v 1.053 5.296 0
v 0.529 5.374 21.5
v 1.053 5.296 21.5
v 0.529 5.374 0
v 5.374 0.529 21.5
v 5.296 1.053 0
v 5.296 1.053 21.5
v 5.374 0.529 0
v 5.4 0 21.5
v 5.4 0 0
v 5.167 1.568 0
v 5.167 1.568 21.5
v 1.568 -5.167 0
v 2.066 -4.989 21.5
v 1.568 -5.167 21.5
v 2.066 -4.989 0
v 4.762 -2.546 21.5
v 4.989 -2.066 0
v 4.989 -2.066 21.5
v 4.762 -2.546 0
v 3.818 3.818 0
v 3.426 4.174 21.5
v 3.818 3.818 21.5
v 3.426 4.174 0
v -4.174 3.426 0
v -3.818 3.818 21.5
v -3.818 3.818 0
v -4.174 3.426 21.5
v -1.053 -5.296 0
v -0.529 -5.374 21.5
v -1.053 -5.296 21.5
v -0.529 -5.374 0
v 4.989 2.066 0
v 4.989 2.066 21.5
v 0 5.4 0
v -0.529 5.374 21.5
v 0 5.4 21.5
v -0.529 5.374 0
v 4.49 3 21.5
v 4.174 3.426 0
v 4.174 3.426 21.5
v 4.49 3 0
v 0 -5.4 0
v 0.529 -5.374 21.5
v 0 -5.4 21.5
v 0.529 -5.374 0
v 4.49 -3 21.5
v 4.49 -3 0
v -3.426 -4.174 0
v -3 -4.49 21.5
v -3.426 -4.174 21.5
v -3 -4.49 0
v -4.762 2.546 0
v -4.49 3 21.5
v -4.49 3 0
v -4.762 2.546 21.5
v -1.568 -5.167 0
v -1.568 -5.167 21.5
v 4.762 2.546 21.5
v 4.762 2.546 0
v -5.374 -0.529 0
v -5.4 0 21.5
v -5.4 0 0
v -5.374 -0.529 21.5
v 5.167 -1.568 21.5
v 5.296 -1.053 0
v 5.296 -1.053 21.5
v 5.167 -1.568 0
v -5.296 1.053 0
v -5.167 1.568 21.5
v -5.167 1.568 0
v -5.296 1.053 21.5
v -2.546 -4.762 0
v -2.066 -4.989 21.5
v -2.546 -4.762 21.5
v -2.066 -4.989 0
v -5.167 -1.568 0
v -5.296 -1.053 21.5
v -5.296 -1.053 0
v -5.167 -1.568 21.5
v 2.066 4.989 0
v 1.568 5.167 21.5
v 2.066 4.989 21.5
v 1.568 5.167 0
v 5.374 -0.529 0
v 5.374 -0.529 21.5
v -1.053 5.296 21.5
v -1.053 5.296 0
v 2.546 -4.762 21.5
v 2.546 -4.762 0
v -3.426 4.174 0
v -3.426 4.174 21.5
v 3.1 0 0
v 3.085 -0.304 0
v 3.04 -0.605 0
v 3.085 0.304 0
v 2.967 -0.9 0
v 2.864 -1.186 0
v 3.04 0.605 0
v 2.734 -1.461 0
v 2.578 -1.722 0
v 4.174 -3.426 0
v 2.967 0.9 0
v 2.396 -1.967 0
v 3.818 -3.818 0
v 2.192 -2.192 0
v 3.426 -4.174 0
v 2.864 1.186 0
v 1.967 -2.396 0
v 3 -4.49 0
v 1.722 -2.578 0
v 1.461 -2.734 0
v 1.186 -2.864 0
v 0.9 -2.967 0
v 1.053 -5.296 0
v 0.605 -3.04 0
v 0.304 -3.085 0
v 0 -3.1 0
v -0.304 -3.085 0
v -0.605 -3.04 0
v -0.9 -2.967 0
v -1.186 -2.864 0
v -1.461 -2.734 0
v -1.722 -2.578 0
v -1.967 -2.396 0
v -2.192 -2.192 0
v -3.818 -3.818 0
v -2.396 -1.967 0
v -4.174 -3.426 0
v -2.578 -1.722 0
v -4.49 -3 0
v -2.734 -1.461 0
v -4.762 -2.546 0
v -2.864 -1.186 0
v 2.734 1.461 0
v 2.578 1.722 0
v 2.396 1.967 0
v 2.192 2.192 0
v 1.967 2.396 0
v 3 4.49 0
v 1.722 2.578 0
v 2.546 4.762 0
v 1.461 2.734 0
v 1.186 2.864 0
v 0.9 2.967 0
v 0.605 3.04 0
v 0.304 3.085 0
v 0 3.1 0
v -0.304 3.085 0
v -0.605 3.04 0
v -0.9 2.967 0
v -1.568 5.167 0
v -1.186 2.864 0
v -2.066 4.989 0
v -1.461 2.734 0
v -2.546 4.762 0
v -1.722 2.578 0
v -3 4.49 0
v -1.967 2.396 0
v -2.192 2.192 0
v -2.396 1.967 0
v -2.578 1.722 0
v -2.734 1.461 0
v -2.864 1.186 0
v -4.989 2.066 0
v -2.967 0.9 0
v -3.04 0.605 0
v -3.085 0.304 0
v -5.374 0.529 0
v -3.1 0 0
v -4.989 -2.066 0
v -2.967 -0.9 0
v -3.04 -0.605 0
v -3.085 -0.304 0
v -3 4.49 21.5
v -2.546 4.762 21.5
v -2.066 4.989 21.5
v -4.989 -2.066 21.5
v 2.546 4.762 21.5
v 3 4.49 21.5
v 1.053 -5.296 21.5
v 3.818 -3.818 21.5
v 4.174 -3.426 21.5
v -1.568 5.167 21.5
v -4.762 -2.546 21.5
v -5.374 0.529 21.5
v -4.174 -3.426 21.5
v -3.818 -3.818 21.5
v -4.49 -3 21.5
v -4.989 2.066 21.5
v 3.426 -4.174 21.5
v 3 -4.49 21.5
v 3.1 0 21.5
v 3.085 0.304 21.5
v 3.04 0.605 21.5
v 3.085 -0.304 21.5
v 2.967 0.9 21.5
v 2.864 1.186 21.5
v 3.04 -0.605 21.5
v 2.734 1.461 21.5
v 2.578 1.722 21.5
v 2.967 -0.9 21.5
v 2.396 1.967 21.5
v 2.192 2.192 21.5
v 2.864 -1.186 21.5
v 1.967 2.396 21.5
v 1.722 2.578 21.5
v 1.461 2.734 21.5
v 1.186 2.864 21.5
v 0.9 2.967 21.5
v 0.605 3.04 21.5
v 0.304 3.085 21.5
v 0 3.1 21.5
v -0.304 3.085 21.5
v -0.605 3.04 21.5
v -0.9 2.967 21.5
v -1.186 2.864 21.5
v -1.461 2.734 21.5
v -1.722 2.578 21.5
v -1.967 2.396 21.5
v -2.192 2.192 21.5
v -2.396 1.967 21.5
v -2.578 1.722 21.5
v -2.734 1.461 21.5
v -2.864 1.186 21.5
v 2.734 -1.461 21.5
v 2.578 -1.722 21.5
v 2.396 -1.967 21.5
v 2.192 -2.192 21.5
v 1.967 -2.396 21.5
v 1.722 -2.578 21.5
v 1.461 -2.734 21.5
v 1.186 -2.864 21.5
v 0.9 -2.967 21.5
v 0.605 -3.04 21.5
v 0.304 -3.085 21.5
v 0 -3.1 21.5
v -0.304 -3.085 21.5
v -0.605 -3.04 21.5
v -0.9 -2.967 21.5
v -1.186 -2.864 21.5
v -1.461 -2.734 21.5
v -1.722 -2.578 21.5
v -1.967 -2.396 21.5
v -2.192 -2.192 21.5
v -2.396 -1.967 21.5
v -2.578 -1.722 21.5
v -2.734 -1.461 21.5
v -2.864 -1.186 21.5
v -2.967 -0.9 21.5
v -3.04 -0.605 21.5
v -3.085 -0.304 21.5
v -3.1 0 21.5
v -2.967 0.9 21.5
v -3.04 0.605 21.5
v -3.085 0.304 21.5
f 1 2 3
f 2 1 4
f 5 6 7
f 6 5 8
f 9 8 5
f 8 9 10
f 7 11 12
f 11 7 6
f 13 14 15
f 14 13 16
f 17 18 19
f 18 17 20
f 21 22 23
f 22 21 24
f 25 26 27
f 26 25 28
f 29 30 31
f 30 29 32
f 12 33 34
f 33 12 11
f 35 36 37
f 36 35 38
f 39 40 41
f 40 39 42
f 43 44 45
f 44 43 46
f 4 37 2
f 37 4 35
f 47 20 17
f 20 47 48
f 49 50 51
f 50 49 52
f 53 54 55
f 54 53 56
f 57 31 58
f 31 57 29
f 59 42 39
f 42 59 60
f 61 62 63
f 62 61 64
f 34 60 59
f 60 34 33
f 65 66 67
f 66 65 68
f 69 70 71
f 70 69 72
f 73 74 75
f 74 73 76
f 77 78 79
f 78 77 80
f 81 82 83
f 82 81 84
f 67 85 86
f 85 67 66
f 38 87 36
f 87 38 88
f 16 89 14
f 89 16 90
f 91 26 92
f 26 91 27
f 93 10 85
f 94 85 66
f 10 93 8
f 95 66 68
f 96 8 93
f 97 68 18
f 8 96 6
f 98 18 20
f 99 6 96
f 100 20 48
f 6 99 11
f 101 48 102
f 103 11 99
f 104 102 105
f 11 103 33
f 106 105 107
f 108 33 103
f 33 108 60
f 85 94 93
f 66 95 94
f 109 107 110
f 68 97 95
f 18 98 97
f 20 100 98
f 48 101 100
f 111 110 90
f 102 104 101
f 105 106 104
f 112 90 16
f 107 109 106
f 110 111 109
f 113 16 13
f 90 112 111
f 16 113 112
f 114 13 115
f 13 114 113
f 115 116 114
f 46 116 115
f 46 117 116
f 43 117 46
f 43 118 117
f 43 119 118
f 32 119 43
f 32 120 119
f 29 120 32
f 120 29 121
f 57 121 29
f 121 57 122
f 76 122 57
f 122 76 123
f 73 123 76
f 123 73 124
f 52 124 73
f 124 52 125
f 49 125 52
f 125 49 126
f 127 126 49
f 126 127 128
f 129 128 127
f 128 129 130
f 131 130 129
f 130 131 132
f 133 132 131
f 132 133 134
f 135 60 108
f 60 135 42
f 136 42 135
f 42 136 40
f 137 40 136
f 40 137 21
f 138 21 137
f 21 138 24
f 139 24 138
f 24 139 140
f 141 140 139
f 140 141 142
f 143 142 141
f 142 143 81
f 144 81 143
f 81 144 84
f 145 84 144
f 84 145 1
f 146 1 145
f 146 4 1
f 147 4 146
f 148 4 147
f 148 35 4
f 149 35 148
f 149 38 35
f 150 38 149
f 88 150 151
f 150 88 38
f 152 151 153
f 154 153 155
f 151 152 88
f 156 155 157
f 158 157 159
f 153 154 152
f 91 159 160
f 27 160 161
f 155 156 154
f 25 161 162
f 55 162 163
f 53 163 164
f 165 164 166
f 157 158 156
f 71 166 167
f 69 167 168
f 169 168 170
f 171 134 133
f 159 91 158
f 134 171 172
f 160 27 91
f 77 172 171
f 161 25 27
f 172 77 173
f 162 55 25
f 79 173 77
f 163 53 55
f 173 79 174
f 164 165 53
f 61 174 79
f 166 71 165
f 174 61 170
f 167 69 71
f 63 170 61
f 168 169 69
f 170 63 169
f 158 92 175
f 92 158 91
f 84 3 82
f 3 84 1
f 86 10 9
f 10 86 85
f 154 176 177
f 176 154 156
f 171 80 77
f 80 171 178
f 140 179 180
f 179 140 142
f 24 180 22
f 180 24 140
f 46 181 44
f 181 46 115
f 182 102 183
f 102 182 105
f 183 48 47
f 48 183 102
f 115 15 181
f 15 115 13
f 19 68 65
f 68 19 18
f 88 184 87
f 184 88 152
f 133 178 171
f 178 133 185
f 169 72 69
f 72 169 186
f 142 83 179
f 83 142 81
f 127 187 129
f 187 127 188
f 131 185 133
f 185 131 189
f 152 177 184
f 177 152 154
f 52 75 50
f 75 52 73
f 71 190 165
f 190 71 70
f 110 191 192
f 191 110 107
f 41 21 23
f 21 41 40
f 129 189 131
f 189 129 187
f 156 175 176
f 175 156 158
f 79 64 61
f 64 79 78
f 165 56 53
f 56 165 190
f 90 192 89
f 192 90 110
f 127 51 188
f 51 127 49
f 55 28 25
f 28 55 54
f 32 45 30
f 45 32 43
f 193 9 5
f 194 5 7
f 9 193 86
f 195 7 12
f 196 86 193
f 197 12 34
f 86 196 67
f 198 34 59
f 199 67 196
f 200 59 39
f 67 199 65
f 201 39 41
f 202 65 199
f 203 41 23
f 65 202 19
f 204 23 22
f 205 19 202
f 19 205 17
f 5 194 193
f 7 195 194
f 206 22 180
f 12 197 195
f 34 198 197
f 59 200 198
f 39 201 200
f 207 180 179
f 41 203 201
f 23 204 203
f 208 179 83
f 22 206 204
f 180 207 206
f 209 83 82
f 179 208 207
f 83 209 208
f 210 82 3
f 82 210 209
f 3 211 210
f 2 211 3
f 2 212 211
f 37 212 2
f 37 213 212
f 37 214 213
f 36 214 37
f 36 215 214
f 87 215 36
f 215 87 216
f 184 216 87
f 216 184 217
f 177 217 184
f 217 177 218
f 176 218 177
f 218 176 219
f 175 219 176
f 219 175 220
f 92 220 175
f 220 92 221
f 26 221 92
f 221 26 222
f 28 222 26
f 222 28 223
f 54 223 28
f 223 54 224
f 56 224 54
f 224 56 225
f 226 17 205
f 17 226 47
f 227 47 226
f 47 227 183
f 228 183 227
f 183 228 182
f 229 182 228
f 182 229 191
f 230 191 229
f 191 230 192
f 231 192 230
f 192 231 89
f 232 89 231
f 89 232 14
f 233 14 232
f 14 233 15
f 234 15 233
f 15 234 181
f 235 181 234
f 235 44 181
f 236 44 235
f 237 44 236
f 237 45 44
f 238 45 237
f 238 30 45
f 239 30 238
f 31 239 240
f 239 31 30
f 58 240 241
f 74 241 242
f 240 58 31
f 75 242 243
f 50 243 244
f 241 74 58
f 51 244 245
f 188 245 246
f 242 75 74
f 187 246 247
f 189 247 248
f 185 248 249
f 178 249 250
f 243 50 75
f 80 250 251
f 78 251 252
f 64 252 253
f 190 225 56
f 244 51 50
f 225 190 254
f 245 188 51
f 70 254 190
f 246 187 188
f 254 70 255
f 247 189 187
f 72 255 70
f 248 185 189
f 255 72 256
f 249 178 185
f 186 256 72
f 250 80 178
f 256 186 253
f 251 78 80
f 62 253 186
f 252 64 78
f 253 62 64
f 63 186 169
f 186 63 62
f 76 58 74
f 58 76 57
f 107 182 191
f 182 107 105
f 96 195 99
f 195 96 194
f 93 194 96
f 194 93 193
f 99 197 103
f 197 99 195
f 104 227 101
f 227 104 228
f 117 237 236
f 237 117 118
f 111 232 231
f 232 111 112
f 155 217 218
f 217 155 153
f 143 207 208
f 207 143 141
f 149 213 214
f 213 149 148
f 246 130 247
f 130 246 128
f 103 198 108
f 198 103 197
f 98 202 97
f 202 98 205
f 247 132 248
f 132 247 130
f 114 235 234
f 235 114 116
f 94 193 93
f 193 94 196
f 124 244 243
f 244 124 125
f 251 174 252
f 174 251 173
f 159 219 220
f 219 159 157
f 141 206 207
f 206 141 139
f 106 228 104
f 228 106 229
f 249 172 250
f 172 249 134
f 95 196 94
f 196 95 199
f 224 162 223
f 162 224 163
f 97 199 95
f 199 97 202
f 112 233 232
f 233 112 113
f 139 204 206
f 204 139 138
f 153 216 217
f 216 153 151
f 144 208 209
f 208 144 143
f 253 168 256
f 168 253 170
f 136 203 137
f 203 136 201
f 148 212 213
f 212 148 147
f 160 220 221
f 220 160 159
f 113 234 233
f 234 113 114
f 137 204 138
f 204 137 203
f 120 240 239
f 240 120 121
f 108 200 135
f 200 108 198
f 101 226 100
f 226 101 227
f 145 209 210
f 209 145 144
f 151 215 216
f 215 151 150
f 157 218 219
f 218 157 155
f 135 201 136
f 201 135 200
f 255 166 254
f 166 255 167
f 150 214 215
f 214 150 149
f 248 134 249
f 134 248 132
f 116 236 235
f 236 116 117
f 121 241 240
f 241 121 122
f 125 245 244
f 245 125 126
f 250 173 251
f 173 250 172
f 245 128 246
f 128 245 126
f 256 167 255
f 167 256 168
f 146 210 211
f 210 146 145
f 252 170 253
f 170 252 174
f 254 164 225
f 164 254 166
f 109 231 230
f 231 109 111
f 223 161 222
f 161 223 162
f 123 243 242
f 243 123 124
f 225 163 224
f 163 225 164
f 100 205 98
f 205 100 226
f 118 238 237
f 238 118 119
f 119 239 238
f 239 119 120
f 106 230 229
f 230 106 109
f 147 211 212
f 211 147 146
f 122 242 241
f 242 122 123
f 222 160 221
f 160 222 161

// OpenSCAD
// PCR Tube Adapter Sleeve - fits 0.2mL tubes into 1.5mL rack holes.
// Print orientation: Collar on bed (Z=0), body rises upward.

// Dimensions
collar_od = 13;      // Collar outer diameter
collar_thick = 1.5;  // Collar thickness (Z=0 to 1.5)
body_od = 10.8;      // Sleeve body outer diameter
body_top_z = 21.5;   // Top of sleeve body
bore_d = 6.2;        // Through-hole diameter

$fn = 64;

// Calculate body height
body_height = body_top_z - collar_thick;

difference() {
    // Main body: Cylinder from Z=0 to Z=body_top_z
    // This creates the solid shape sitting on the bed.
    translate([0, 0, 0]) 
        cylinder(h = body_top_z, d = body_od);
    
    // Collar: Ring from Z=0 to Z=collar_thick
    // Outer radius = collar_od/2, Inner radius = body_od/2
    // This is redundant geometrically if the main cylinder is solid, 
    // but explicitly defines the collar region if we were doing union/difference differently.
    // Here, the main cylinder already covers this volume.
    
    // Through-hole: Cylinder extending slightly past top and bottom to ensure clean cut.
    // Starts at Z = -0.1 to ensure it cuts through the bottom face at Z=0.
    translate([0, 0, -0.1]) 
        cylinder(h = body_top_z + 0.9, d = bore_d);
}
